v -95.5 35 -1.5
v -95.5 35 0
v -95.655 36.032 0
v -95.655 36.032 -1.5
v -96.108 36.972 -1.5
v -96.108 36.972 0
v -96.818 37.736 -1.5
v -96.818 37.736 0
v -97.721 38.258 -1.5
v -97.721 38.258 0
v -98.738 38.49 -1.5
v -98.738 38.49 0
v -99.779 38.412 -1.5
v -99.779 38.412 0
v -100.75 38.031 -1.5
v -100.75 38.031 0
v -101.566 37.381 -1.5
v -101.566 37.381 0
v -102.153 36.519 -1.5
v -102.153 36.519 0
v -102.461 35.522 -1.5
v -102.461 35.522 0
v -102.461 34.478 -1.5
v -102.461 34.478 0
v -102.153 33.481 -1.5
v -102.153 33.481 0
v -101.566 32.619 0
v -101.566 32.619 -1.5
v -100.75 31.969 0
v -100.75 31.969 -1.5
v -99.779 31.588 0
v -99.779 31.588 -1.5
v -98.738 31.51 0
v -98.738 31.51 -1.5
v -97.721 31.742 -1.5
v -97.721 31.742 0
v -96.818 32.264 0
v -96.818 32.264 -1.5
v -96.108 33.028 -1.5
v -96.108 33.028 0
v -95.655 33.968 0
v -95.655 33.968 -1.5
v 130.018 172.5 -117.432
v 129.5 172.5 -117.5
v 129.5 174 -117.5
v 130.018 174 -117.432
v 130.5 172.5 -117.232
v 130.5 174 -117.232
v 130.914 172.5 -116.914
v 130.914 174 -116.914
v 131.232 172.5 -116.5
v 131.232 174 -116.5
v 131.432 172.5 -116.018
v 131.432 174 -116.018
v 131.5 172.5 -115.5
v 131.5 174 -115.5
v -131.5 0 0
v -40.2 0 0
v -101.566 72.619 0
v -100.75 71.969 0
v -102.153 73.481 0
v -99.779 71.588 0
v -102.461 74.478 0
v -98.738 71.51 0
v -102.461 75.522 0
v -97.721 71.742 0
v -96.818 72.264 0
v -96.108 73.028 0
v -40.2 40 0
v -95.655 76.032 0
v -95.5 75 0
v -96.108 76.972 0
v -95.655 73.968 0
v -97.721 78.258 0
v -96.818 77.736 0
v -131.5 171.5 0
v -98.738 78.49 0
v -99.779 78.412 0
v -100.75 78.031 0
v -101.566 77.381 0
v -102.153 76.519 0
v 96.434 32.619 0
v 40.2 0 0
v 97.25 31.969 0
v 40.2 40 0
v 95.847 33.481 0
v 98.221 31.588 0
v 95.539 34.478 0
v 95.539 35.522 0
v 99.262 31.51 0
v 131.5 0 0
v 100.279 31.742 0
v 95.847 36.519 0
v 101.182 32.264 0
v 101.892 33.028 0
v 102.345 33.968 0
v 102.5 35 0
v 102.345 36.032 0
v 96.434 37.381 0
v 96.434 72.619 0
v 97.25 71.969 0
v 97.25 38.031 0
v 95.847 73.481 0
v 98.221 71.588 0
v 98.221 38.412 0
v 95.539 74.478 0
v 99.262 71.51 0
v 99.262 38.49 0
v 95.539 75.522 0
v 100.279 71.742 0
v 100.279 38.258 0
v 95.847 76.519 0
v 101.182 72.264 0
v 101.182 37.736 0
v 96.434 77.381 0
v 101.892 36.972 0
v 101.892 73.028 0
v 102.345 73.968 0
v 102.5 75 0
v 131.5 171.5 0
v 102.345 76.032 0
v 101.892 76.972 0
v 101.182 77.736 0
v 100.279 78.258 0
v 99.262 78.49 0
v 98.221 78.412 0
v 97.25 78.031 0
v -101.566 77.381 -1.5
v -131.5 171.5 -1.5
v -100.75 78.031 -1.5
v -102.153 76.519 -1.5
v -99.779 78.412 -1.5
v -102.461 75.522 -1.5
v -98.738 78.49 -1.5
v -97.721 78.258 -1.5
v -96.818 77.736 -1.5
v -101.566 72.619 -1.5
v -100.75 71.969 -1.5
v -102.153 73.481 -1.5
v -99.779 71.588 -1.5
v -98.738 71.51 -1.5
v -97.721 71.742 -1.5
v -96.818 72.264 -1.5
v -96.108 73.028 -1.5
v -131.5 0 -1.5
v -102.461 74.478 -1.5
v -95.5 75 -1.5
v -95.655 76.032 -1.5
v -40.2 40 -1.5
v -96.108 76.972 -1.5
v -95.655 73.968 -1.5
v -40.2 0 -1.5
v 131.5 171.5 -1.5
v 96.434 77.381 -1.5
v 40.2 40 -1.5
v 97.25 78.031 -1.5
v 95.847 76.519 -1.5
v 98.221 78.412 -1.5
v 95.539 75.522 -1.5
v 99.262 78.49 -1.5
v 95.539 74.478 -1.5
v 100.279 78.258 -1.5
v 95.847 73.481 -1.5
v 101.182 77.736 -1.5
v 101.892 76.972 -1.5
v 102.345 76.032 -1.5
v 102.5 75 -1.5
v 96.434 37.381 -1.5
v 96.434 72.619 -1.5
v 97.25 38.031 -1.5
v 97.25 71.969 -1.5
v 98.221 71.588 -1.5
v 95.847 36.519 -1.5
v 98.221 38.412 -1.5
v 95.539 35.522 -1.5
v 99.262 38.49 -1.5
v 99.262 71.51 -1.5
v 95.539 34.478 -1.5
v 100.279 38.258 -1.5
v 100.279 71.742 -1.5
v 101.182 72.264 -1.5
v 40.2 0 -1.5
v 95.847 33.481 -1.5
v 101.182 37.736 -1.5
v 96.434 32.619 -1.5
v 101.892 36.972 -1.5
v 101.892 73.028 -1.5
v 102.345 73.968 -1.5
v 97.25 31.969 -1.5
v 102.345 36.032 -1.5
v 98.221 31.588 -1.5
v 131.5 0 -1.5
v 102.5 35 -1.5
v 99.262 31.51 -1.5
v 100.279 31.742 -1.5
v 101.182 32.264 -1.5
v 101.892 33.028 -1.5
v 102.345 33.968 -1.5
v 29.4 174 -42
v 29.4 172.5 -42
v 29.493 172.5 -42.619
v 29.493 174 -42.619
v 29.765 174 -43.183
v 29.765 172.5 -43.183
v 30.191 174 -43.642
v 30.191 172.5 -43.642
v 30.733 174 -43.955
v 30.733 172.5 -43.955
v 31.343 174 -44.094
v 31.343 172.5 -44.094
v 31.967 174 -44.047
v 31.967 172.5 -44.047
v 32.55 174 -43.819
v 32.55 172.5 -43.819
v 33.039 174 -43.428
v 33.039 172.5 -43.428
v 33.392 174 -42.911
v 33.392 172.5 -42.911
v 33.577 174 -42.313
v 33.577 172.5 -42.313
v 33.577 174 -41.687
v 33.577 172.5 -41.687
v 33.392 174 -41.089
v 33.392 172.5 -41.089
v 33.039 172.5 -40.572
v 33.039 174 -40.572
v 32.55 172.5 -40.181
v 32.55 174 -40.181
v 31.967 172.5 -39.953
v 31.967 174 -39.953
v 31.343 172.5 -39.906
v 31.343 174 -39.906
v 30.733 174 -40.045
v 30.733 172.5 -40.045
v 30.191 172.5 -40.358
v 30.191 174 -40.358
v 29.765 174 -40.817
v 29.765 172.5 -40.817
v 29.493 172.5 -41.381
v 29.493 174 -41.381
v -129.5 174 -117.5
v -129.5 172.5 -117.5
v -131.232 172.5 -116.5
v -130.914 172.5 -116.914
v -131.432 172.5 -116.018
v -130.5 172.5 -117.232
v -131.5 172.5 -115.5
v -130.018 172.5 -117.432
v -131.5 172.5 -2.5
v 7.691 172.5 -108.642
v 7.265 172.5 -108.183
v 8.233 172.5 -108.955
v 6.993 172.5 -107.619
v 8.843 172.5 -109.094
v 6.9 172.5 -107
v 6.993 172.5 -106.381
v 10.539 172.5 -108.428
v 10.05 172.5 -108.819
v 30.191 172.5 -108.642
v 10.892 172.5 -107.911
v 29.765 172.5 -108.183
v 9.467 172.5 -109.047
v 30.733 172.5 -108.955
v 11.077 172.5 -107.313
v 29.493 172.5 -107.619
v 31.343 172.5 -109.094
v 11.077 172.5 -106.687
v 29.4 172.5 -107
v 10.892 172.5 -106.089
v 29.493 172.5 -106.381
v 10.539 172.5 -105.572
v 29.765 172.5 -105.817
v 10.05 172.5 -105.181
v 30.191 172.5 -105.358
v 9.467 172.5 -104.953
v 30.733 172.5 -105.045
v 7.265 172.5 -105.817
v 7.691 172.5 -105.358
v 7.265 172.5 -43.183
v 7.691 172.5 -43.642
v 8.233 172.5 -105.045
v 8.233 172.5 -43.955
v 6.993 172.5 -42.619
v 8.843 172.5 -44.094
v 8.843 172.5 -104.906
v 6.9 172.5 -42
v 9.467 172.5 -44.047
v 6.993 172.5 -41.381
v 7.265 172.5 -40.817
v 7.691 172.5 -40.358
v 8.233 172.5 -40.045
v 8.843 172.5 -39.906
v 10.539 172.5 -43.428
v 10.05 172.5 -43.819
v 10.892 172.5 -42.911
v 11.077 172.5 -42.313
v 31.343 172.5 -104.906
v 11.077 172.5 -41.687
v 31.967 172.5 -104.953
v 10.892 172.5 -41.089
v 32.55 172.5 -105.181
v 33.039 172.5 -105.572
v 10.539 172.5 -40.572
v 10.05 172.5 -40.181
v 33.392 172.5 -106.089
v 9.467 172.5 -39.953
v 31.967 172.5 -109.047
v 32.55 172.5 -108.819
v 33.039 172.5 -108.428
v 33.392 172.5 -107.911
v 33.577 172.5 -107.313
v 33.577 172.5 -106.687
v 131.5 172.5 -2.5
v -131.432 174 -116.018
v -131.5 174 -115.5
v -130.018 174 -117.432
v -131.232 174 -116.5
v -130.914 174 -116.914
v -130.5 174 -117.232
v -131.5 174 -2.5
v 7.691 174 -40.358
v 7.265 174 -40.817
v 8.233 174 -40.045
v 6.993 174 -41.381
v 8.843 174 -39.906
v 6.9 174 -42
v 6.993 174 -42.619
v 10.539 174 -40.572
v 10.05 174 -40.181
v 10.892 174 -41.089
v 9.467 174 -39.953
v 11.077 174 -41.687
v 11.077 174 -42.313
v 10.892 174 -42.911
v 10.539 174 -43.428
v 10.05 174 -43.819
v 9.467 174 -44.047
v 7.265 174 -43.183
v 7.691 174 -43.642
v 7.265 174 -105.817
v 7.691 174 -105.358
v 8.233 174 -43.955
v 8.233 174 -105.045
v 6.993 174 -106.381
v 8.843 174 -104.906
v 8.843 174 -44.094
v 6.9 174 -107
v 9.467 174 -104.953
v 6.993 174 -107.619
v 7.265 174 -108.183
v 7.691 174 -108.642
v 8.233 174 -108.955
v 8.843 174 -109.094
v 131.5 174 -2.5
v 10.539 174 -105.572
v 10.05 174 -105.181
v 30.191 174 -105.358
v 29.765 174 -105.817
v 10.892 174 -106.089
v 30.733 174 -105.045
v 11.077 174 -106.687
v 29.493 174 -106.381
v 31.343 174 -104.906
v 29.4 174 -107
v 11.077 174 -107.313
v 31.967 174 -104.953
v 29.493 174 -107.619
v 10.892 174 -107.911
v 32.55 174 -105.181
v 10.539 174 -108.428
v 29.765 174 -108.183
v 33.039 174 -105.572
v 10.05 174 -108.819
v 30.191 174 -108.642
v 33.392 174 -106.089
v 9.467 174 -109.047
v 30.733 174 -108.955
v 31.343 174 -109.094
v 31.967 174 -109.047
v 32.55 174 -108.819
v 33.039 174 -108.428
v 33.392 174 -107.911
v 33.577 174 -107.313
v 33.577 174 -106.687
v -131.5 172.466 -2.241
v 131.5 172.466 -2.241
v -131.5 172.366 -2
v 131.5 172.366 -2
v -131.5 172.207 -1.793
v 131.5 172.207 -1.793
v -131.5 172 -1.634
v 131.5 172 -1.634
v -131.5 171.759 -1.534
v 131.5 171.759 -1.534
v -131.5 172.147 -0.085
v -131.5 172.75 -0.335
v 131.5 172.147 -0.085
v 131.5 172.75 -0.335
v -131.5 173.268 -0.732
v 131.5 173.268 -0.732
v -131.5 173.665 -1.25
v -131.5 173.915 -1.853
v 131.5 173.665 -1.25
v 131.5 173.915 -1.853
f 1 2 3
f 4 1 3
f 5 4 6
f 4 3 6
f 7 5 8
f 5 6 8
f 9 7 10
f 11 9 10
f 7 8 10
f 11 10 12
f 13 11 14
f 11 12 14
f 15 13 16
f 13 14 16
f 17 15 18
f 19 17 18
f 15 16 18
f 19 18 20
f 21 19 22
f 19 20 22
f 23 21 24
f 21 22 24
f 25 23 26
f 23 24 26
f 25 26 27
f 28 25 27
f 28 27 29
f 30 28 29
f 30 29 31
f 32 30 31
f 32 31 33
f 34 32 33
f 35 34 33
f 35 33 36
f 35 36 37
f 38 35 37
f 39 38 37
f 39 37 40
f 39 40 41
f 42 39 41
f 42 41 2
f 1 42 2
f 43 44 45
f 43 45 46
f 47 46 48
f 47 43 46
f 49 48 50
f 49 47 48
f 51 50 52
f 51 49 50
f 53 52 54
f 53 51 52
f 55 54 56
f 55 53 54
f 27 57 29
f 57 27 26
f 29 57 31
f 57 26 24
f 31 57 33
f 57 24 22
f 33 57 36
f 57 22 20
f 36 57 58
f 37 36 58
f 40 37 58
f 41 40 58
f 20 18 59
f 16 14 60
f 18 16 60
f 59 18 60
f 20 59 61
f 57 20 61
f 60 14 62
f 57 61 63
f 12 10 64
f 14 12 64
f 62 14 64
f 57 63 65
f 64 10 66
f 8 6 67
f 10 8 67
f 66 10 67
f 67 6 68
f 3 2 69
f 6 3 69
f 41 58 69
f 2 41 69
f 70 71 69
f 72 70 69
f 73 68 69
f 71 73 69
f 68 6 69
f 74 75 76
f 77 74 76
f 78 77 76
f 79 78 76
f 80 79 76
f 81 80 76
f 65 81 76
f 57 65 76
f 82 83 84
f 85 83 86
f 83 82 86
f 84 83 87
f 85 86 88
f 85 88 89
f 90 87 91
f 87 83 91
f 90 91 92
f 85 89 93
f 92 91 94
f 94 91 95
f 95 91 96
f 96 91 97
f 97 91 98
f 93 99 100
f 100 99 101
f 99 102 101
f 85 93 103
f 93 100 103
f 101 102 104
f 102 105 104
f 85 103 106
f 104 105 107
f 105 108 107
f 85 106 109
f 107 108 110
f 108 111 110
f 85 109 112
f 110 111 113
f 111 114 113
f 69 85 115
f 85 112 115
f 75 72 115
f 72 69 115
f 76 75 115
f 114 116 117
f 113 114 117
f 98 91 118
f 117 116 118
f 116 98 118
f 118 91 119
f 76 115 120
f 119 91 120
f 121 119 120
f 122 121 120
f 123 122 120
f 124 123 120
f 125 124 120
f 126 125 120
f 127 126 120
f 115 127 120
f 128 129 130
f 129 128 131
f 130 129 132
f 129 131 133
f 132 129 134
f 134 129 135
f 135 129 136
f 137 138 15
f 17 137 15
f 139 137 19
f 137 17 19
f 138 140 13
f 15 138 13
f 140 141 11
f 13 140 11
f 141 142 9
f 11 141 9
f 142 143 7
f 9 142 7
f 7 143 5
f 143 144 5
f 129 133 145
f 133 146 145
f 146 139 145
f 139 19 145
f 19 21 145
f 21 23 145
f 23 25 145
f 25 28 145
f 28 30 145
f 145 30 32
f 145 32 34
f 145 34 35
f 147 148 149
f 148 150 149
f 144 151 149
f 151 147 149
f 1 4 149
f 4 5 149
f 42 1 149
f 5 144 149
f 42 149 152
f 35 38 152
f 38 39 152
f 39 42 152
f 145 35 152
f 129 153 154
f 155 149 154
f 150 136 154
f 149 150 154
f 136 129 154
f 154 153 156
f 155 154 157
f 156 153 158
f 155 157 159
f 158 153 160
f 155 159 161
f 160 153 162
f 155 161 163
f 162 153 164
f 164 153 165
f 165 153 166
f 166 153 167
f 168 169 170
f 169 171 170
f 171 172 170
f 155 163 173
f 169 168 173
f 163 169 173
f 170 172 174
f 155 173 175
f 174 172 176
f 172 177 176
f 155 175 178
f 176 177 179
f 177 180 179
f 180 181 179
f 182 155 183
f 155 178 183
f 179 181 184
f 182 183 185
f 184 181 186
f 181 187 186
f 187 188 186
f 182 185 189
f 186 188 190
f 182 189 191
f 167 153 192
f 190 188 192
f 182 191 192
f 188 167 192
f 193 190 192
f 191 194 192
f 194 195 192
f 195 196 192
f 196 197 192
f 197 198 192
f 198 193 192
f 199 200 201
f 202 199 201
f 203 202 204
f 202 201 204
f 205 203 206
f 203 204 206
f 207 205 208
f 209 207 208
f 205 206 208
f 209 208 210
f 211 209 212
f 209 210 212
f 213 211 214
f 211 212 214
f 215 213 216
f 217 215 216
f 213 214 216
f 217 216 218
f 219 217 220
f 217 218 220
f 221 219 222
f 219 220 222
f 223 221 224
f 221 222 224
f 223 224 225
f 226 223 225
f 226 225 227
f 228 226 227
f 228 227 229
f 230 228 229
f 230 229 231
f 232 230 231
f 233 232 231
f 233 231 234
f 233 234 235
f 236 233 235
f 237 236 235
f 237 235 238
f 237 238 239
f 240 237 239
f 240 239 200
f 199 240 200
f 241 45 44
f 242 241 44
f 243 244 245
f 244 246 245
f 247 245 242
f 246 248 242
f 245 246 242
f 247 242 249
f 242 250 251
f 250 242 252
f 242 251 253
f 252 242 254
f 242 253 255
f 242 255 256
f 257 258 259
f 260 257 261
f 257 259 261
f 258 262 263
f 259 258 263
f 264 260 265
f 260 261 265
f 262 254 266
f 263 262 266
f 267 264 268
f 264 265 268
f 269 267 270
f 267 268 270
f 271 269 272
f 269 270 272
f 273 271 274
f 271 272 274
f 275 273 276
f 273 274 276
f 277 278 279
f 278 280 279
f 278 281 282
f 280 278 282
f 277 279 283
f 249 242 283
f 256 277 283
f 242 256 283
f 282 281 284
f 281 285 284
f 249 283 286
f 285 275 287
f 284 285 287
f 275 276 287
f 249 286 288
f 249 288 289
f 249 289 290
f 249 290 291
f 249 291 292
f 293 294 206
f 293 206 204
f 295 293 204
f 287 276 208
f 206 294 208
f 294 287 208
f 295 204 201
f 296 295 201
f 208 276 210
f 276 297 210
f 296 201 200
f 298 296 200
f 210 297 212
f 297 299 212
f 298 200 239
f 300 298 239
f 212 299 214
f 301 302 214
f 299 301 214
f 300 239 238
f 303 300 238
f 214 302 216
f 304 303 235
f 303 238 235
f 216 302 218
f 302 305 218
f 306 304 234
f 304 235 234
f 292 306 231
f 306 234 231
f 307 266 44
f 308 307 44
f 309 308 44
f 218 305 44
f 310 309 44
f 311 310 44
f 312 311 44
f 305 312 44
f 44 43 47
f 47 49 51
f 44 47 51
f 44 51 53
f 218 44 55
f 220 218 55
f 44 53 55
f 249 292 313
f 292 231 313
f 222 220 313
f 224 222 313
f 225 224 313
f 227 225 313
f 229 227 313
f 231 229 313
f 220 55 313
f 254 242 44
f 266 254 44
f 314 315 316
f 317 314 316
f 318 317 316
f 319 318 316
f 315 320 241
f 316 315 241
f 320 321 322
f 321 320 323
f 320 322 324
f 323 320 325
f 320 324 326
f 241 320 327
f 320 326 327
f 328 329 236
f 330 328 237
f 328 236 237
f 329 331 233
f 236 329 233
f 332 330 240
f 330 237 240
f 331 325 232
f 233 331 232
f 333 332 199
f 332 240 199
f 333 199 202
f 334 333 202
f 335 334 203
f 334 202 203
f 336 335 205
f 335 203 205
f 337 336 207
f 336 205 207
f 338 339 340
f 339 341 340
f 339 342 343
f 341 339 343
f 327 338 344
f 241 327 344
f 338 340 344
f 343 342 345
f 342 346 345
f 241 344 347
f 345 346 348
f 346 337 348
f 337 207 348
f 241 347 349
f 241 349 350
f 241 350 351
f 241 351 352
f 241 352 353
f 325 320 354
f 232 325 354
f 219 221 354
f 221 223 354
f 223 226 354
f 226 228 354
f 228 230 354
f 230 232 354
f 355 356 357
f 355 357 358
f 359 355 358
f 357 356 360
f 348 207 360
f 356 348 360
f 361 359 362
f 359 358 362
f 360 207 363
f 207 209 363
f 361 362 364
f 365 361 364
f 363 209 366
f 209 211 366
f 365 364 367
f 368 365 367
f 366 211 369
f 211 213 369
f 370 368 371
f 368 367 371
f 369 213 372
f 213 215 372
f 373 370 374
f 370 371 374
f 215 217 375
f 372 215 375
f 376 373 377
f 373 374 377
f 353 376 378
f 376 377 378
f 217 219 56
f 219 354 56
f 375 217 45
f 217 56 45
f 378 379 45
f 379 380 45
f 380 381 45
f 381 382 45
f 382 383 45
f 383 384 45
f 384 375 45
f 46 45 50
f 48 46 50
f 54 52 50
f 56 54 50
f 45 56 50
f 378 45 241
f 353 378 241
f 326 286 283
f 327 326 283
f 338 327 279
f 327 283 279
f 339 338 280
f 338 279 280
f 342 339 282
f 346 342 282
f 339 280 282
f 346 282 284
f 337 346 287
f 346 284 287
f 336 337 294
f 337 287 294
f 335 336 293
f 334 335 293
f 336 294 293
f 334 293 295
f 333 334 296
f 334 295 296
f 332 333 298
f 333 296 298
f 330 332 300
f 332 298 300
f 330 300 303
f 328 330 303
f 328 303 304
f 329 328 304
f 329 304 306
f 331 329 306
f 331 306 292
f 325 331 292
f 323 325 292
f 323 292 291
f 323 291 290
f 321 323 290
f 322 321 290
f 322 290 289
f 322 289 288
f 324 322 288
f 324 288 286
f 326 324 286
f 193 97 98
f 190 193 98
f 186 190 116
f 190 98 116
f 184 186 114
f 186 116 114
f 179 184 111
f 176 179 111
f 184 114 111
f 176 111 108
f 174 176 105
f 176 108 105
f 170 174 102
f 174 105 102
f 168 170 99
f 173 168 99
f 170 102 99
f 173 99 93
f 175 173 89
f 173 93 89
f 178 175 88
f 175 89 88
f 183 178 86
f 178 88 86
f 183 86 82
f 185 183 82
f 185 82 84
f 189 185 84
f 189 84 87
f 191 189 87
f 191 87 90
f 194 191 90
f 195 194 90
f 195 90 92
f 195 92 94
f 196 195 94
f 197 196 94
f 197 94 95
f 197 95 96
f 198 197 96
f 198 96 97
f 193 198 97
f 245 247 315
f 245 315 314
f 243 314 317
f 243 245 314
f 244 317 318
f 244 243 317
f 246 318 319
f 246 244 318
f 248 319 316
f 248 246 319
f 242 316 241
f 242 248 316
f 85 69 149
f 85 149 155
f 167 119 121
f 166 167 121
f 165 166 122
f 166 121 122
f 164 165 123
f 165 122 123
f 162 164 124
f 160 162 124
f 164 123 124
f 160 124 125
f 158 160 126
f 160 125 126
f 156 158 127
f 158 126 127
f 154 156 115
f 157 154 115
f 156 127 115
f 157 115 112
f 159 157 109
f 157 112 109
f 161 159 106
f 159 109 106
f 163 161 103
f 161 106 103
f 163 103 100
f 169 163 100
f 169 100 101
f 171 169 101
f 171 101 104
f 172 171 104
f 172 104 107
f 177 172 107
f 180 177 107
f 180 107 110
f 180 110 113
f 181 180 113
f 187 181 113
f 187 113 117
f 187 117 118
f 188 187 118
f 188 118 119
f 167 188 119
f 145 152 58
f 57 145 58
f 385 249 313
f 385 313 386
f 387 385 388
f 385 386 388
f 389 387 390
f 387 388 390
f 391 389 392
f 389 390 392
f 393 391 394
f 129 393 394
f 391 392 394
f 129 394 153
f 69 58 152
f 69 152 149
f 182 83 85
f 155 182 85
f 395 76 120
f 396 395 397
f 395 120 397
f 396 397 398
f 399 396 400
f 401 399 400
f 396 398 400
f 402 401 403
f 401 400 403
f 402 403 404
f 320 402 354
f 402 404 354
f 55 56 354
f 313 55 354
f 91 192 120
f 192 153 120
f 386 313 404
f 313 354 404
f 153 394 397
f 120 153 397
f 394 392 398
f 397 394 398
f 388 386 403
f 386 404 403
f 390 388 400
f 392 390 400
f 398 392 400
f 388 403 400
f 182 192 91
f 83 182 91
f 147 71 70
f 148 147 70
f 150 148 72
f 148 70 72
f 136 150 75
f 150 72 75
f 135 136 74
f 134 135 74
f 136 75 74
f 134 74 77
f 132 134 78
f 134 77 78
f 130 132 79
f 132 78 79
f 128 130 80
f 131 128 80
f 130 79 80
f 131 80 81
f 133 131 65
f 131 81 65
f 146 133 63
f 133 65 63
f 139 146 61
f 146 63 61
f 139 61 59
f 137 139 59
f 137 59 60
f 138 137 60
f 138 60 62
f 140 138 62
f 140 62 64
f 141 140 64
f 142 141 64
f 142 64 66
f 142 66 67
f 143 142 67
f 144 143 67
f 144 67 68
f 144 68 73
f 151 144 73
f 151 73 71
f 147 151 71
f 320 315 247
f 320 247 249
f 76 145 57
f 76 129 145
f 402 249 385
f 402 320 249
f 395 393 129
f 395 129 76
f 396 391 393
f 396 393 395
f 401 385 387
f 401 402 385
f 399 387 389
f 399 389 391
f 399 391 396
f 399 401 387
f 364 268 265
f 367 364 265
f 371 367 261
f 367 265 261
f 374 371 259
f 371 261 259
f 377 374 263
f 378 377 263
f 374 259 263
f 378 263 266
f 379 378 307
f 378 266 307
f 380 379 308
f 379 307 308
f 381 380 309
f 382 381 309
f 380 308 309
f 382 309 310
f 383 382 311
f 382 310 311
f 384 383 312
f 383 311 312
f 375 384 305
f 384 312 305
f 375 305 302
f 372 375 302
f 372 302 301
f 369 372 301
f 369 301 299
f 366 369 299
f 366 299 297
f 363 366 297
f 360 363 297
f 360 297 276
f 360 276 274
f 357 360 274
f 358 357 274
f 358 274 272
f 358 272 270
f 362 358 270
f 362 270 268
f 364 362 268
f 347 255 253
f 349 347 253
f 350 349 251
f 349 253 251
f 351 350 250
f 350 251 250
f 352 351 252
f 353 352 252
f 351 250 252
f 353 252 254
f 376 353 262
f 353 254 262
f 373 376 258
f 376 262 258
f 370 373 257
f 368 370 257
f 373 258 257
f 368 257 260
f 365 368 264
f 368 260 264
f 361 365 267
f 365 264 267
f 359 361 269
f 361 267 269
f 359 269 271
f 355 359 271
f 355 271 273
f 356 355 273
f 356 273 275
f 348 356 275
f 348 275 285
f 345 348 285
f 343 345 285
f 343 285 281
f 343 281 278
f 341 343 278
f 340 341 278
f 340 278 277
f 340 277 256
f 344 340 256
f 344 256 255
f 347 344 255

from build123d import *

# Parameters (mm, degrees)
SM_BASE_FLANGE_1_DEPTH = 131.5
HOLE_WIZARD_M6_1_D     = 7
SKETCH_6_W             = 80.4
SKETCH_6_H             = 40
CUT_EXTRUDE_1_DEPTH    = 248.738773711
HOLE_WIZARD_M5_1_D     = 4.2
OTHER_START            = 172.5
OTHER_1_DEPTH          = 1.5


# Read off the part's stored shape, not the designer's step: 断开-边角1
# Sheet-metal steps are written as plain solids
with BuildPart() as part:
    # Sketch 1 → 基体-法兰1 (new, symmetric)
    with BuildSketch(Plane(origin=(0, 0, 0), x_dir=(0, 0, -1), z_dir=(1, 0, 0))):
        with BuildLine():
            Line((0, 0), (0, 171.5))
            ThreePointArc((0, 171.5), (0.732233047, 173.267766953), (2.5, 174))
            Line((2.5, 174), (117.5, 174))
            Line((117.5, 174), (117.5, 172.5))
            Line((117.5, 172.5), (2.5, 172.5))
            ThreePointArc((2.5, 172.5), (1.792893219, 172.207106781), (1.5, 171.5))
            Line((1.5, 171.5), (1.5, 0))
            Line((1.5, 0), (0, 0))
        make_face()
    extrude(amount=SM_BASE_FLANGE_1_DEPTH, both=True)

    # M6 间隙孔1 (through all)
    with Locations(Plane(origin=(0, 0, -1.5), x_dir=(-1, 0, 0), z_dir=(0, 0, -1))):
        with Locations((-99, 75), (-99, 35), (99, 35), (99, 75)):
            Hole(HOLE_WIZARD_M6_1_D / 2)

    # 草图6 → 切除-拉伸1 (cut, through all)
    with BuildSketch(Plane.XY):
        with Locations((0, 20)):
            Rectangle(SKETCH_6_W, SKETCH_6_H)
    extrude(amount=-CUT_EXTRUDE_1_DEPTH, mode=Mode.SUBTRACT)

    # M5 螺纹孔1 (through all)
    with Locations(Plane(origin=(0, 174, 0), x_dir=(1, 0, 0), z_dir=(0, 1, 0))):
        with Locations((9, 107), (31.5, 107), (31.5, 42), (9, 42)):
            Hole(HOLE_WIZARD_M5_1_D / 2)

    # Other 1 outline → Other 1 (cut)
    with BuildSketch(Plane(origin=(0, 0, 0), x_dir=(1, 0, 0), z_dir=(0, 1, 0)).offset(OTHER_START)):
        with BuildLine():
            Line((131.5, 117.5), (129.5, 117.5))
            ThreePointArc((129.5, 117.5), (130.914213562, 116.914213562), (131.5, 115.5))
            Line((131.5, 115.5), (131.5, 117.5))
        make_face()
        with BuildLine():
            ThreePointArc((-131.5, 115.5), (-130.914213562, 116.914213562), (-129.5, 117.5))
            Line((-129.5, 117.5), (-131.5, 117.5))
            Line((-131.5, 117.5), (-131.5, 115.5))
        make_face()
    extrude(amount=OTHER_1_DEPTH, mode=Mode.SUBTRACT)


solid = part.part
